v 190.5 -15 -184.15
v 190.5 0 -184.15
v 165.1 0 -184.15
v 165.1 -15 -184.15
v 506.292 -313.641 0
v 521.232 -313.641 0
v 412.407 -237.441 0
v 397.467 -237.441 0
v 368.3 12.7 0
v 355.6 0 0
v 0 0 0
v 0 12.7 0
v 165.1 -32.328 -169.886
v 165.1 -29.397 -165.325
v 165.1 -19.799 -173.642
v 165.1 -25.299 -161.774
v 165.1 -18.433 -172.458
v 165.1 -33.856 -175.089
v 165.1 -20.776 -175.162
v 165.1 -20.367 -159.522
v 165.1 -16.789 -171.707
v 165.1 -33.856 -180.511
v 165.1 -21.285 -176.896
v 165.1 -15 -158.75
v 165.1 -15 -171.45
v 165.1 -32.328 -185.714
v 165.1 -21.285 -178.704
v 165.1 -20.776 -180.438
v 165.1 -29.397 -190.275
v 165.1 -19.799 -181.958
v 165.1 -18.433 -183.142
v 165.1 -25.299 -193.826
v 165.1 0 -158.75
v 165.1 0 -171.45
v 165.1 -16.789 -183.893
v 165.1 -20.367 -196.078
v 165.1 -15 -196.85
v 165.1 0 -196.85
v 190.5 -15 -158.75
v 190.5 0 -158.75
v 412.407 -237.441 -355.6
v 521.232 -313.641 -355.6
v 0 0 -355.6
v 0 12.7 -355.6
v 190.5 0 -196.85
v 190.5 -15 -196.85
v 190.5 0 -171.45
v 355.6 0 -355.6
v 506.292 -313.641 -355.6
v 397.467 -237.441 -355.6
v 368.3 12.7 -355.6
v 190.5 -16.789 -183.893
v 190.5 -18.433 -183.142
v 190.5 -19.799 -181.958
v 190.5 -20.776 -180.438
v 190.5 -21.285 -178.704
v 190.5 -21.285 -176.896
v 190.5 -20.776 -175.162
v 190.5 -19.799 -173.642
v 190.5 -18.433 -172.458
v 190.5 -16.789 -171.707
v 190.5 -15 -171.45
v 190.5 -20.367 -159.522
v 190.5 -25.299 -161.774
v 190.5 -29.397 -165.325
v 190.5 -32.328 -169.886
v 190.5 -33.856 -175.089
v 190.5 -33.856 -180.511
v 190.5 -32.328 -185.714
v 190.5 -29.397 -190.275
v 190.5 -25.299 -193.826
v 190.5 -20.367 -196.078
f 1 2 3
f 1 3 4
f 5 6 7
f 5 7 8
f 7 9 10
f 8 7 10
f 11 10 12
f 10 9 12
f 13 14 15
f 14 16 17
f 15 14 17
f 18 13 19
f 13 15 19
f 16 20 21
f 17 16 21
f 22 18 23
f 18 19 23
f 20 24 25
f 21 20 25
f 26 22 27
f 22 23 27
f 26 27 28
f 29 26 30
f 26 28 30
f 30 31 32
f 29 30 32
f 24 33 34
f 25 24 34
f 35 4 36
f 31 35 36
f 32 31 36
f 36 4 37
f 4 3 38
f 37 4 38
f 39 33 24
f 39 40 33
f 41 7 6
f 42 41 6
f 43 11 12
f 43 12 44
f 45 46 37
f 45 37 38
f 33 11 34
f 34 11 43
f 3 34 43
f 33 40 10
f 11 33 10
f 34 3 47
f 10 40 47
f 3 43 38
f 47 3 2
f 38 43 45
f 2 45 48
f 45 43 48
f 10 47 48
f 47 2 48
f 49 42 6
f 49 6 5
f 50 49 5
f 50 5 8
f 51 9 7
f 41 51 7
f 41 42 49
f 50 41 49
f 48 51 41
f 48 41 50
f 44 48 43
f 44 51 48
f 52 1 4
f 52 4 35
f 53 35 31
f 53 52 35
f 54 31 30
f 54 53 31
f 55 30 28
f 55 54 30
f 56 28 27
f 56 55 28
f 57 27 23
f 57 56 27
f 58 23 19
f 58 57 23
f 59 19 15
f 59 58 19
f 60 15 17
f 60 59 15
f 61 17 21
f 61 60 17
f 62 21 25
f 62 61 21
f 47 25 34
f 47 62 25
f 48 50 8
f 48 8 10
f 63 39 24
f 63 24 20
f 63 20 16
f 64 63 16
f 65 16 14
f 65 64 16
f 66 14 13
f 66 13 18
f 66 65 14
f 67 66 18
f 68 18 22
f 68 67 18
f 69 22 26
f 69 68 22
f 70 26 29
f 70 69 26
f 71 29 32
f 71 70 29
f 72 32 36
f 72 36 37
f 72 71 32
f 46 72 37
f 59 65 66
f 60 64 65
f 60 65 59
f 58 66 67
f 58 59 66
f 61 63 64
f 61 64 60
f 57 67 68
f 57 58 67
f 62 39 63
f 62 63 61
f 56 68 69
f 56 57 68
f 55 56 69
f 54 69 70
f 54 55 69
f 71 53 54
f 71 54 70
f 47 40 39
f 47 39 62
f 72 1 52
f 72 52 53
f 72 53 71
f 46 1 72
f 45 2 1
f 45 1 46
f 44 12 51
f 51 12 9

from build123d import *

# Parameters (mm, degrees)
SKETCH1_W           = 355.6
SKETCH1_H           = 355.6
BOSS_EXTRUDE1_DEPTH = 12.7
BOSS_EXTRUDE2_DEPTH = 12.7
BOSS_EXTRUDE4_DEPTH = 355.6


with BuildPart() as part:
    # Sketch1 → Boss-Extrude1 (new body)
    with BuildSketch(Plane(origin=(0, 0, 0), x_dir=(1, 0, 0), z_dir=(0, 1, 0))):
        with Locations((177.8, 177.8)):
            Rectangle(SKETCH1_W, SKETCH1_H)
    extrude(amount=BOSS_EXTRUDE1_DEPTH)

    # Sketch3 → Boss-Extrude2 (add, symmetric)
    with BuildSketch(Plane(origin=(177.8, 0, 0), x_dir=(0, 0, -1), z_dir=(1, 0, 0))):
        with BuildLine():
            Line((158.75, 0), (158.75, -15))
            ThreePointArc((158.75, -15), (177.8, -34.05), (196.85, -15))
            Line((196.85, -15), (196.85, 0))
            Line((196.85, 0), (184.15, 0))
            Line((184.15, 0), (184.15, -15))
            ThreePointArc((184.15, -15), (177.8, -21.35), (171.45, -15))
            Line((171.45, -15), (171.45, 0))
            Line((171.45, 0), (158.75, 0))
        make_face()
    extrude(amount=BOSS_EXTRUDE2_DEPTH, both=True)

    # Sketch6 → Boss-Extrude4 (add)
    with BuildSketch(Plane.XY):
        Polygon((368.3, 12.7), (412.406637127, -237.441169265), (521.231515241, -313.641169265), (506.292162586, -313.641169265), (397.467284472, -237.441169265), (355.6, 0), (355.6, 12.7), align=None)
    extrude(amount=-BOSS_EXTRUDE4_DEPTH)


solid = part.part
